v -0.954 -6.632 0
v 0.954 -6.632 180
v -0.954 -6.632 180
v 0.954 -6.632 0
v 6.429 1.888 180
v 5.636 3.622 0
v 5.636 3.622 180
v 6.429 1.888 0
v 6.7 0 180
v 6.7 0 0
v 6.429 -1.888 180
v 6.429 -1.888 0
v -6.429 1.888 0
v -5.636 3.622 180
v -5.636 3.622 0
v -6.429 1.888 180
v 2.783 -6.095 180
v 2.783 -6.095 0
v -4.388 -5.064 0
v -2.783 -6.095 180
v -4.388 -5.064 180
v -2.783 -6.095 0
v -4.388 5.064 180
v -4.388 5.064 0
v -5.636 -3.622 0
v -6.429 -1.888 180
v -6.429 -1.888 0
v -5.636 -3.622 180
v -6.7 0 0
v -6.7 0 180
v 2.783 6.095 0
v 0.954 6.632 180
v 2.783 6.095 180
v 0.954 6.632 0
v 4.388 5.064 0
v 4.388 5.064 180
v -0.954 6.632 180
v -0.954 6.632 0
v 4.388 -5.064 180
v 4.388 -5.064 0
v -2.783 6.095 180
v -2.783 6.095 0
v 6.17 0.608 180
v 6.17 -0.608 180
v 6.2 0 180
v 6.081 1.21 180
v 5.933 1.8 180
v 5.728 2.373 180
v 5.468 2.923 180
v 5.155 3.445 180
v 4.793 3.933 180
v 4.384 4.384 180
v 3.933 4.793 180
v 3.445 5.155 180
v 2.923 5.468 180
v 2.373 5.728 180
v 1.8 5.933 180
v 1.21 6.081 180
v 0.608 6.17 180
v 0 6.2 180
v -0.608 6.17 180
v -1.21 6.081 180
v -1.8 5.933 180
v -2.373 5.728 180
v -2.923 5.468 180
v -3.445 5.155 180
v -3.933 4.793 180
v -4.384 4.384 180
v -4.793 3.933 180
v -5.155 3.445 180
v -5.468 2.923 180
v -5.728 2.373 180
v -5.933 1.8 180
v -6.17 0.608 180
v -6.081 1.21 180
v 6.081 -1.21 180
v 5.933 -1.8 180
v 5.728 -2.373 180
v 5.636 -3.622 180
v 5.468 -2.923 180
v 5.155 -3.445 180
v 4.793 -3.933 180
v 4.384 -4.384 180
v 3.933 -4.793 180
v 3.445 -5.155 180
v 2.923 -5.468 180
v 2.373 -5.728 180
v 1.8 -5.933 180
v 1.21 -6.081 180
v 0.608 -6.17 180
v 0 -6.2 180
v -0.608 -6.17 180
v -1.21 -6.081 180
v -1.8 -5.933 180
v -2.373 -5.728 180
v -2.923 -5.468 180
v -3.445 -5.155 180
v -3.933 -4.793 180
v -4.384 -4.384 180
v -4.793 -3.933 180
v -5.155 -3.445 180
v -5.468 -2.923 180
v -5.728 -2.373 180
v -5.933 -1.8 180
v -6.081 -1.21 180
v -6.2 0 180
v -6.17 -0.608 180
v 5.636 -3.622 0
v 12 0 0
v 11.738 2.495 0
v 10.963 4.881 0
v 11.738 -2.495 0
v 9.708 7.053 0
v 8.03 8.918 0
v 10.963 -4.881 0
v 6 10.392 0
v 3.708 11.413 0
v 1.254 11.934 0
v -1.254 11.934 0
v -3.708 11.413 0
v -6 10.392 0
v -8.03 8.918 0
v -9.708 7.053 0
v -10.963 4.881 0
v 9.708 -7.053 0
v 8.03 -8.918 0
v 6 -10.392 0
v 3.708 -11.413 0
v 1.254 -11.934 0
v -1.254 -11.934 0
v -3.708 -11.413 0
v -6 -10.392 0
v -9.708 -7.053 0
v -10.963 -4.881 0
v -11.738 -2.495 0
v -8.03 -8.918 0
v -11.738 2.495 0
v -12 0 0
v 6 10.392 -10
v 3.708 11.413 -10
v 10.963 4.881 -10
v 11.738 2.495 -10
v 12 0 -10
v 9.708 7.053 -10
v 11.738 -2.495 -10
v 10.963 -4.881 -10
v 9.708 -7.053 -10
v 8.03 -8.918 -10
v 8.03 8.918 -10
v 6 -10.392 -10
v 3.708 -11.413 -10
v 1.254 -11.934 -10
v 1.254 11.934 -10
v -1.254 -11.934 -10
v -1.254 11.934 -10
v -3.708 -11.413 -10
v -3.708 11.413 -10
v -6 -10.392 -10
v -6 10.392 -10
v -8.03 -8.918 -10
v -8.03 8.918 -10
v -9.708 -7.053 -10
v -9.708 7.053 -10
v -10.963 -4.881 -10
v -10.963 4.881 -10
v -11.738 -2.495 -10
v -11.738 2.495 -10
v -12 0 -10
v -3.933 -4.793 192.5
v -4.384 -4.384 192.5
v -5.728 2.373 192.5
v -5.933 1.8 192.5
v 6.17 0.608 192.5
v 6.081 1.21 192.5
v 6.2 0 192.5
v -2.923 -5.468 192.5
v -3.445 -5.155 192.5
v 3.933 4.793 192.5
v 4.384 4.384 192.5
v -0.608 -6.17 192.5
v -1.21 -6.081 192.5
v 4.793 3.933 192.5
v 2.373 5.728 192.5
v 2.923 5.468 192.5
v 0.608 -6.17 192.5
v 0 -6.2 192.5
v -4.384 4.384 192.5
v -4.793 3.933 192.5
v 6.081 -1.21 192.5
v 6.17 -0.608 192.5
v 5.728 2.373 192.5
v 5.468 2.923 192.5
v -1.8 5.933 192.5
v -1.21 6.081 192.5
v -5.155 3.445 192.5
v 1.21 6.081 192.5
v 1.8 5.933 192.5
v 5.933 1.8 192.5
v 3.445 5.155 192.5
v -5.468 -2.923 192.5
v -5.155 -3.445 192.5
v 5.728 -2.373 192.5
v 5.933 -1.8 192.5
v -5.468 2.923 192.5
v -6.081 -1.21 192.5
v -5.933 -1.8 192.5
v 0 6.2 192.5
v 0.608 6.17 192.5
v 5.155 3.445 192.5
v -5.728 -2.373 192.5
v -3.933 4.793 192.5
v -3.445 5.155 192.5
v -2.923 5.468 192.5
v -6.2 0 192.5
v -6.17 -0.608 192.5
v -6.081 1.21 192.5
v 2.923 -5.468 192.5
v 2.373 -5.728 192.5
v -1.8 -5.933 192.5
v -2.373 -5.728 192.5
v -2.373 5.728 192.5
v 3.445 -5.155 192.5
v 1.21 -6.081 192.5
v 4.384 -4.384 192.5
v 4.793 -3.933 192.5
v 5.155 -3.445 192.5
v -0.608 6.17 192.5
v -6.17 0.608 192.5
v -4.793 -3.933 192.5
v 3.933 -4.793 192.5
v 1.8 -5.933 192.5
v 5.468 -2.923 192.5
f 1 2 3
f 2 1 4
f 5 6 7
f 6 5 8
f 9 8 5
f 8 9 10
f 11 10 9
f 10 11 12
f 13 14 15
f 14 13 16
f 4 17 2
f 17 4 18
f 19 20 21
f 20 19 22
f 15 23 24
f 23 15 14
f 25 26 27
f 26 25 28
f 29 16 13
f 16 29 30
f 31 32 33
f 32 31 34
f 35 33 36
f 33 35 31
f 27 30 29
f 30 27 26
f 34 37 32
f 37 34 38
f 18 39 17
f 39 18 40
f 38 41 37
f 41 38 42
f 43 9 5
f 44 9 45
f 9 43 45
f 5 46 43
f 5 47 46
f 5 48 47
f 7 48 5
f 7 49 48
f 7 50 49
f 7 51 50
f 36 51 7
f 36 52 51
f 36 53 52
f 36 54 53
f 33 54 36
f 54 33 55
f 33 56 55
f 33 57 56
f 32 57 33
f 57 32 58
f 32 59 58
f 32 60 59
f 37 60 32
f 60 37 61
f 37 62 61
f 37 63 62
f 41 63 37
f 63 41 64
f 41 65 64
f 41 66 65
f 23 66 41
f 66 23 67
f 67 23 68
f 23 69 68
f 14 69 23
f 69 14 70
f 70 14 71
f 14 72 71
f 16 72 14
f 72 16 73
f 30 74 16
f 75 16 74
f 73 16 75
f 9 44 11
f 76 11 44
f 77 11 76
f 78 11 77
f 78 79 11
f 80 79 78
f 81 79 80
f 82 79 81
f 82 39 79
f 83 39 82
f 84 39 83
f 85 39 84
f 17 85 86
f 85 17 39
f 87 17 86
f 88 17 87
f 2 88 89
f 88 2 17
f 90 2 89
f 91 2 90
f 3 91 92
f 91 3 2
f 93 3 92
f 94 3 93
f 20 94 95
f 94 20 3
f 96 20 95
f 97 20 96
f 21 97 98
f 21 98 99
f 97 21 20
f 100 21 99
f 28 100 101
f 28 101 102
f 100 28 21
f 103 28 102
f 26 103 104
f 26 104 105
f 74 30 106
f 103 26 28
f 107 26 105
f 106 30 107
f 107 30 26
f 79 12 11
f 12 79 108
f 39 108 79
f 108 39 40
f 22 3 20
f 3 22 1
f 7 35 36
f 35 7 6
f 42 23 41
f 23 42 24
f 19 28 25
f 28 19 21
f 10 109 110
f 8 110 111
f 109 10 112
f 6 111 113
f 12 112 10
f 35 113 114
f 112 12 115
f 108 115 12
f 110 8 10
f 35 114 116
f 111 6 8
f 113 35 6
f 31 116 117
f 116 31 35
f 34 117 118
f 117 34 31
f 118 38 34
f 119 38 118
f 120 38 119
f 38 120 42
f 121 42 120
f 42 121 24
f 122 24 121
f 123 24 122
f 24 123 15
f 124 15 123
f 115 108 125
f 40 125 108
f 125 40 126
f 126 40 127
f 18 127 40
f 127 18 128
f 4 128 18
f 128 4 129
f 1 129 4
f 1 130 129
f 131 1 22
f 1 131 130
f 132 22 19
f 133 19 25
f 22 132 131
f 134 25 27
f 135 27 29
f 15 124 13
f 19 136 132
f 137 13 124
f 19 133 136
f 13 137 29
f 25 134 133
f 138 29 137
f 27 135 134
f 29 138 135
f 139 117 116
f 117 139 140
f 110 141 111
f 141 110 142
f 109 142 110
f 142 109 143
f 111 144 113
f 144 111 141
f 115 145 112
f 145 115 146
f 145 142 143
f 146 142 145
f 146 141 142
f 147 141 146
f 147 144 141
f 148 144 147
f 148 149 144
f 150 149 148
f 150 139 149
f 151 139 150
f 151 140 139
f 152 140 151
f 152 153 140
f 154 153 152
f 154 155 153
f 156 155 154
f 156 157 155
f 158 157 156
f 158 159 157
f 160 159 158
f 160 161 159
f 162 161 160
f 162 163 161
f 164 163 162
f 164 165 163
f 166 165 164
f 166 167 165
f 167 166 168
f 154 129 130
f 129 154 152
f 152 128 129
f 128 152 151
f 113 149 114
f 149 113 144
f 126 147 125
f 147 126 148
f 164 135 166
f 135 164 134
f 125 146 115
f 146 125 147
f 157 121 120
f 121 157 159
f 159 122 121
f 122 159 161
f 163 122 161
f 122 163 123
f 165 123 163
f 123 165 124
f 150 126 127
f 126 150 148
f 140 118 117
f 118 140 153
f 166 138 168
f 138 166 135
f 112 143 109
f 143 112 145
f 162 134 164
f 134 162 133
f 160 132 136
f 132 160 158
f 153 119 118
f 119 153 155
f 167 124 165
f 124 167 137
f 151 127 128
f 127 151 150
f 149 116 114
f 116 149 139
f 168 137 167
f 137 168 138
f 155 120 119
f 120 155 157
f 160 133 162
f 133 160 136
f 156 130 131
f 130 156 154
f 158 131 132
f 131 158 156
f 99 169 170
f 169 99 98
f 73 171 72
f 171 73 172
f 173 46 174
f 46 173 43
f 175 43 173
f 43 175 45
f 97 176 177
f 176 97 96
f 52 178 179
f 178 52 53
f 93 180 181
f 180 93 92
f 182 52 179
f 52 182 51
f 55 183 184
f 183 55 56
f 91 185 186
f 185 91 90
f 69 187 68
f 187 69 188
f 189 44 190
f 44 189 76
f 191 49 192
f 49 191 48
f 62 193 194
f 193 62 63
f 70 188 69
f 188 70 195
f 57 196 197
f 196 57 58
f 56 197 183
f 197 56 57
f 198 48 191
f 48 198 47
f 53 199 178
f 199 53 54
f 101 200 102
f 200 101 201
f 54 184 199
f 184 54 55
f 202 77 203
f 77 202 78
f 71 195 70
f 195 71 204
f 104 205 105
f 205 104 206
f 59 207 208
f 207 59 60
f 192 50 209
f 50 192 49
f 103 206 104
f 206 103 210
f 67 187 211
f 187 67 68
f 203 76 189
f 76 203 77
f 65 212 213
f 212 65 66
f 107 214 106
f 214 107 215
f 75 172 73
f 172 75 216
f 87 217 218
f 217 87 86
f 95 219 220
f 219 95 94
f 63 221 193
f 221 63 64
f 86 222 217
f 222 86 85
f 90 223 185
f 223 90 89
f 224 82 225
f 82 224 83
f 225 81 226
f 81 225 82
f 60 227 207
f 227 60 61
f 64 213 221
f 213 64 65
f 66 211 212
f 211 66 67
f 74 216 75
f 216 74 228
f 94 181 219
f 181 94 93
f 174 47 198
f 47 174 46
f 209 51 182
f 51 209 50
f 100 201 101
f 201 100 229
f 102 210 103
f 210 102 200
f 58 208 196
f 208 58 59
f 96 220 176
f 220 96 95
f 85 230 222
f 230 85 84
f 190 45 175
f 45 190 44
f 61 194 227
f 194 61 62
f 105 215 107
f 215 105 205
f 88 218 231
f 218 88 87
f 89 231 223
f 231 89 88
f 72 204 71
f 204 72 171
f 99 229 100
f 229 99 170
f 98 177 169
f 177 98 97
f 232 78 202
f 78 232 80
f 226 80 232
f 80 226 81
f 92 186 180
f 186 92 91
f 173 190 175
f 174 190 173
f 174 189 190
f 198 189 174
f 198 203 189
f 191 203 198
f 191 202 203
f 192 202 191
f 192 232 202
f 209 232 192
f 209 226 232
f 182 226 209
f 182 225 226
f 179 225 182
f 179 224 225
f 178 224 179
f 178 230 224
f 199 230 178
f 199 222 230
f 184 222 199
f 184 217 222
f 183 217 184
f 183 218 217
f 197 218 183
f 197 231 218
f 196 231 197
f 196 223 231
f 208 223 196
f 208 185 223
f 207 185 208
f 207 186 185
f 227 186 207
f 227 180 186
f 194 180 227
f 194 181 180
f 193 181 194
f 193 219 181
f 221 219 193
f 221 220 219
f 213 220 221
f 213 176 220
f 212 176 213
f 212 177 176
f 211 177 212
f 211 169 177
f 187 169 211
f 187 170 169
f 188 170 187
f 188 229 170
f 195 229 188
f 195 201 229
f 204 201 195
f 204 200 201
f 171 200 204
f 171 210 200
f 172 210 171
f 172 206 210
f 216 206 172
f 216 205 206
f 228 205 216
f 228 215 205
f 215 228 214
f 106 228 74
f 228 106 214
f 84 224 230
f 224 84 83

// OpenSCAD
// file: BOSL2/threading.scad
// Minimal thread approximations for bundled gallery models.
// These preserve dimensions for preview/export without generating helical thread detail.

CENTER = [0, 0, 0];

module screw_thread(d=10, l=10, pitch=1, internal=false, anchor=CENTER) {
    center = anchor == CENTER;
    translate(center ? [0, 0, 0] : [0, 0, l / 2])
        cylinder(d=d, h=l, center=true);
}

module threaded_rod(d=10, l=10, pitch=1, internal=false, anchor=CENTER) {
    screw_thread(d=d, l=l, pitch=pitch, internal=internal, anchor=anchor);
}
// file: BOSL2/std.scad
// Minimal BOSL2 compatibility shim for bundled gallery models.
// It implements only the helpers used by the imported OpenSCAD projects.

CENTER = [0, 0, 0];
BOTTOM = [0, 0, -1];
TOP = [0, 0, 1];
LEFT = [-1, 0, 0];
RIGHT = [1, 0, 0];
FRONT = [0, -1, 0];
BACK = [0, 1, 0];

module up(z=0) {
    translate([0, 0, z]) children();
}

module down(z=0) {
    translate([0, 0, -z]) children();
}

module attach(anchor=CENTER) {
    children();
}

module cuboid(size=[1, 1, 1], anchor=CENTER) {
    center = anchor == CENTER;
    translate(center ? [0, 0, 0] : [0, 0, size[2] / 2])
        cube(size, center=true);
    children();
}

module xcyl(h=1, r=1, anchor=CENTER) {
    center = anchor == CENTER;
    translate(center ? [0, 0, 0] : [h / 2, 0, 0])
        rotate([0, 90, 0])
            cylinder(h=h, r=r, center=true);
}
// main file
include <BOSL2/std.scad>
include <BOSL2/threading.scad>



cylinder(180, 6.7,6.7);
translate ([0,0,-10]) cylinder(10,12,12);
translate ([0,0,185])threaded_rod(d=12.4, l=15, end_len2=5, pitch=1.5, $fn=64, bevel = true);
